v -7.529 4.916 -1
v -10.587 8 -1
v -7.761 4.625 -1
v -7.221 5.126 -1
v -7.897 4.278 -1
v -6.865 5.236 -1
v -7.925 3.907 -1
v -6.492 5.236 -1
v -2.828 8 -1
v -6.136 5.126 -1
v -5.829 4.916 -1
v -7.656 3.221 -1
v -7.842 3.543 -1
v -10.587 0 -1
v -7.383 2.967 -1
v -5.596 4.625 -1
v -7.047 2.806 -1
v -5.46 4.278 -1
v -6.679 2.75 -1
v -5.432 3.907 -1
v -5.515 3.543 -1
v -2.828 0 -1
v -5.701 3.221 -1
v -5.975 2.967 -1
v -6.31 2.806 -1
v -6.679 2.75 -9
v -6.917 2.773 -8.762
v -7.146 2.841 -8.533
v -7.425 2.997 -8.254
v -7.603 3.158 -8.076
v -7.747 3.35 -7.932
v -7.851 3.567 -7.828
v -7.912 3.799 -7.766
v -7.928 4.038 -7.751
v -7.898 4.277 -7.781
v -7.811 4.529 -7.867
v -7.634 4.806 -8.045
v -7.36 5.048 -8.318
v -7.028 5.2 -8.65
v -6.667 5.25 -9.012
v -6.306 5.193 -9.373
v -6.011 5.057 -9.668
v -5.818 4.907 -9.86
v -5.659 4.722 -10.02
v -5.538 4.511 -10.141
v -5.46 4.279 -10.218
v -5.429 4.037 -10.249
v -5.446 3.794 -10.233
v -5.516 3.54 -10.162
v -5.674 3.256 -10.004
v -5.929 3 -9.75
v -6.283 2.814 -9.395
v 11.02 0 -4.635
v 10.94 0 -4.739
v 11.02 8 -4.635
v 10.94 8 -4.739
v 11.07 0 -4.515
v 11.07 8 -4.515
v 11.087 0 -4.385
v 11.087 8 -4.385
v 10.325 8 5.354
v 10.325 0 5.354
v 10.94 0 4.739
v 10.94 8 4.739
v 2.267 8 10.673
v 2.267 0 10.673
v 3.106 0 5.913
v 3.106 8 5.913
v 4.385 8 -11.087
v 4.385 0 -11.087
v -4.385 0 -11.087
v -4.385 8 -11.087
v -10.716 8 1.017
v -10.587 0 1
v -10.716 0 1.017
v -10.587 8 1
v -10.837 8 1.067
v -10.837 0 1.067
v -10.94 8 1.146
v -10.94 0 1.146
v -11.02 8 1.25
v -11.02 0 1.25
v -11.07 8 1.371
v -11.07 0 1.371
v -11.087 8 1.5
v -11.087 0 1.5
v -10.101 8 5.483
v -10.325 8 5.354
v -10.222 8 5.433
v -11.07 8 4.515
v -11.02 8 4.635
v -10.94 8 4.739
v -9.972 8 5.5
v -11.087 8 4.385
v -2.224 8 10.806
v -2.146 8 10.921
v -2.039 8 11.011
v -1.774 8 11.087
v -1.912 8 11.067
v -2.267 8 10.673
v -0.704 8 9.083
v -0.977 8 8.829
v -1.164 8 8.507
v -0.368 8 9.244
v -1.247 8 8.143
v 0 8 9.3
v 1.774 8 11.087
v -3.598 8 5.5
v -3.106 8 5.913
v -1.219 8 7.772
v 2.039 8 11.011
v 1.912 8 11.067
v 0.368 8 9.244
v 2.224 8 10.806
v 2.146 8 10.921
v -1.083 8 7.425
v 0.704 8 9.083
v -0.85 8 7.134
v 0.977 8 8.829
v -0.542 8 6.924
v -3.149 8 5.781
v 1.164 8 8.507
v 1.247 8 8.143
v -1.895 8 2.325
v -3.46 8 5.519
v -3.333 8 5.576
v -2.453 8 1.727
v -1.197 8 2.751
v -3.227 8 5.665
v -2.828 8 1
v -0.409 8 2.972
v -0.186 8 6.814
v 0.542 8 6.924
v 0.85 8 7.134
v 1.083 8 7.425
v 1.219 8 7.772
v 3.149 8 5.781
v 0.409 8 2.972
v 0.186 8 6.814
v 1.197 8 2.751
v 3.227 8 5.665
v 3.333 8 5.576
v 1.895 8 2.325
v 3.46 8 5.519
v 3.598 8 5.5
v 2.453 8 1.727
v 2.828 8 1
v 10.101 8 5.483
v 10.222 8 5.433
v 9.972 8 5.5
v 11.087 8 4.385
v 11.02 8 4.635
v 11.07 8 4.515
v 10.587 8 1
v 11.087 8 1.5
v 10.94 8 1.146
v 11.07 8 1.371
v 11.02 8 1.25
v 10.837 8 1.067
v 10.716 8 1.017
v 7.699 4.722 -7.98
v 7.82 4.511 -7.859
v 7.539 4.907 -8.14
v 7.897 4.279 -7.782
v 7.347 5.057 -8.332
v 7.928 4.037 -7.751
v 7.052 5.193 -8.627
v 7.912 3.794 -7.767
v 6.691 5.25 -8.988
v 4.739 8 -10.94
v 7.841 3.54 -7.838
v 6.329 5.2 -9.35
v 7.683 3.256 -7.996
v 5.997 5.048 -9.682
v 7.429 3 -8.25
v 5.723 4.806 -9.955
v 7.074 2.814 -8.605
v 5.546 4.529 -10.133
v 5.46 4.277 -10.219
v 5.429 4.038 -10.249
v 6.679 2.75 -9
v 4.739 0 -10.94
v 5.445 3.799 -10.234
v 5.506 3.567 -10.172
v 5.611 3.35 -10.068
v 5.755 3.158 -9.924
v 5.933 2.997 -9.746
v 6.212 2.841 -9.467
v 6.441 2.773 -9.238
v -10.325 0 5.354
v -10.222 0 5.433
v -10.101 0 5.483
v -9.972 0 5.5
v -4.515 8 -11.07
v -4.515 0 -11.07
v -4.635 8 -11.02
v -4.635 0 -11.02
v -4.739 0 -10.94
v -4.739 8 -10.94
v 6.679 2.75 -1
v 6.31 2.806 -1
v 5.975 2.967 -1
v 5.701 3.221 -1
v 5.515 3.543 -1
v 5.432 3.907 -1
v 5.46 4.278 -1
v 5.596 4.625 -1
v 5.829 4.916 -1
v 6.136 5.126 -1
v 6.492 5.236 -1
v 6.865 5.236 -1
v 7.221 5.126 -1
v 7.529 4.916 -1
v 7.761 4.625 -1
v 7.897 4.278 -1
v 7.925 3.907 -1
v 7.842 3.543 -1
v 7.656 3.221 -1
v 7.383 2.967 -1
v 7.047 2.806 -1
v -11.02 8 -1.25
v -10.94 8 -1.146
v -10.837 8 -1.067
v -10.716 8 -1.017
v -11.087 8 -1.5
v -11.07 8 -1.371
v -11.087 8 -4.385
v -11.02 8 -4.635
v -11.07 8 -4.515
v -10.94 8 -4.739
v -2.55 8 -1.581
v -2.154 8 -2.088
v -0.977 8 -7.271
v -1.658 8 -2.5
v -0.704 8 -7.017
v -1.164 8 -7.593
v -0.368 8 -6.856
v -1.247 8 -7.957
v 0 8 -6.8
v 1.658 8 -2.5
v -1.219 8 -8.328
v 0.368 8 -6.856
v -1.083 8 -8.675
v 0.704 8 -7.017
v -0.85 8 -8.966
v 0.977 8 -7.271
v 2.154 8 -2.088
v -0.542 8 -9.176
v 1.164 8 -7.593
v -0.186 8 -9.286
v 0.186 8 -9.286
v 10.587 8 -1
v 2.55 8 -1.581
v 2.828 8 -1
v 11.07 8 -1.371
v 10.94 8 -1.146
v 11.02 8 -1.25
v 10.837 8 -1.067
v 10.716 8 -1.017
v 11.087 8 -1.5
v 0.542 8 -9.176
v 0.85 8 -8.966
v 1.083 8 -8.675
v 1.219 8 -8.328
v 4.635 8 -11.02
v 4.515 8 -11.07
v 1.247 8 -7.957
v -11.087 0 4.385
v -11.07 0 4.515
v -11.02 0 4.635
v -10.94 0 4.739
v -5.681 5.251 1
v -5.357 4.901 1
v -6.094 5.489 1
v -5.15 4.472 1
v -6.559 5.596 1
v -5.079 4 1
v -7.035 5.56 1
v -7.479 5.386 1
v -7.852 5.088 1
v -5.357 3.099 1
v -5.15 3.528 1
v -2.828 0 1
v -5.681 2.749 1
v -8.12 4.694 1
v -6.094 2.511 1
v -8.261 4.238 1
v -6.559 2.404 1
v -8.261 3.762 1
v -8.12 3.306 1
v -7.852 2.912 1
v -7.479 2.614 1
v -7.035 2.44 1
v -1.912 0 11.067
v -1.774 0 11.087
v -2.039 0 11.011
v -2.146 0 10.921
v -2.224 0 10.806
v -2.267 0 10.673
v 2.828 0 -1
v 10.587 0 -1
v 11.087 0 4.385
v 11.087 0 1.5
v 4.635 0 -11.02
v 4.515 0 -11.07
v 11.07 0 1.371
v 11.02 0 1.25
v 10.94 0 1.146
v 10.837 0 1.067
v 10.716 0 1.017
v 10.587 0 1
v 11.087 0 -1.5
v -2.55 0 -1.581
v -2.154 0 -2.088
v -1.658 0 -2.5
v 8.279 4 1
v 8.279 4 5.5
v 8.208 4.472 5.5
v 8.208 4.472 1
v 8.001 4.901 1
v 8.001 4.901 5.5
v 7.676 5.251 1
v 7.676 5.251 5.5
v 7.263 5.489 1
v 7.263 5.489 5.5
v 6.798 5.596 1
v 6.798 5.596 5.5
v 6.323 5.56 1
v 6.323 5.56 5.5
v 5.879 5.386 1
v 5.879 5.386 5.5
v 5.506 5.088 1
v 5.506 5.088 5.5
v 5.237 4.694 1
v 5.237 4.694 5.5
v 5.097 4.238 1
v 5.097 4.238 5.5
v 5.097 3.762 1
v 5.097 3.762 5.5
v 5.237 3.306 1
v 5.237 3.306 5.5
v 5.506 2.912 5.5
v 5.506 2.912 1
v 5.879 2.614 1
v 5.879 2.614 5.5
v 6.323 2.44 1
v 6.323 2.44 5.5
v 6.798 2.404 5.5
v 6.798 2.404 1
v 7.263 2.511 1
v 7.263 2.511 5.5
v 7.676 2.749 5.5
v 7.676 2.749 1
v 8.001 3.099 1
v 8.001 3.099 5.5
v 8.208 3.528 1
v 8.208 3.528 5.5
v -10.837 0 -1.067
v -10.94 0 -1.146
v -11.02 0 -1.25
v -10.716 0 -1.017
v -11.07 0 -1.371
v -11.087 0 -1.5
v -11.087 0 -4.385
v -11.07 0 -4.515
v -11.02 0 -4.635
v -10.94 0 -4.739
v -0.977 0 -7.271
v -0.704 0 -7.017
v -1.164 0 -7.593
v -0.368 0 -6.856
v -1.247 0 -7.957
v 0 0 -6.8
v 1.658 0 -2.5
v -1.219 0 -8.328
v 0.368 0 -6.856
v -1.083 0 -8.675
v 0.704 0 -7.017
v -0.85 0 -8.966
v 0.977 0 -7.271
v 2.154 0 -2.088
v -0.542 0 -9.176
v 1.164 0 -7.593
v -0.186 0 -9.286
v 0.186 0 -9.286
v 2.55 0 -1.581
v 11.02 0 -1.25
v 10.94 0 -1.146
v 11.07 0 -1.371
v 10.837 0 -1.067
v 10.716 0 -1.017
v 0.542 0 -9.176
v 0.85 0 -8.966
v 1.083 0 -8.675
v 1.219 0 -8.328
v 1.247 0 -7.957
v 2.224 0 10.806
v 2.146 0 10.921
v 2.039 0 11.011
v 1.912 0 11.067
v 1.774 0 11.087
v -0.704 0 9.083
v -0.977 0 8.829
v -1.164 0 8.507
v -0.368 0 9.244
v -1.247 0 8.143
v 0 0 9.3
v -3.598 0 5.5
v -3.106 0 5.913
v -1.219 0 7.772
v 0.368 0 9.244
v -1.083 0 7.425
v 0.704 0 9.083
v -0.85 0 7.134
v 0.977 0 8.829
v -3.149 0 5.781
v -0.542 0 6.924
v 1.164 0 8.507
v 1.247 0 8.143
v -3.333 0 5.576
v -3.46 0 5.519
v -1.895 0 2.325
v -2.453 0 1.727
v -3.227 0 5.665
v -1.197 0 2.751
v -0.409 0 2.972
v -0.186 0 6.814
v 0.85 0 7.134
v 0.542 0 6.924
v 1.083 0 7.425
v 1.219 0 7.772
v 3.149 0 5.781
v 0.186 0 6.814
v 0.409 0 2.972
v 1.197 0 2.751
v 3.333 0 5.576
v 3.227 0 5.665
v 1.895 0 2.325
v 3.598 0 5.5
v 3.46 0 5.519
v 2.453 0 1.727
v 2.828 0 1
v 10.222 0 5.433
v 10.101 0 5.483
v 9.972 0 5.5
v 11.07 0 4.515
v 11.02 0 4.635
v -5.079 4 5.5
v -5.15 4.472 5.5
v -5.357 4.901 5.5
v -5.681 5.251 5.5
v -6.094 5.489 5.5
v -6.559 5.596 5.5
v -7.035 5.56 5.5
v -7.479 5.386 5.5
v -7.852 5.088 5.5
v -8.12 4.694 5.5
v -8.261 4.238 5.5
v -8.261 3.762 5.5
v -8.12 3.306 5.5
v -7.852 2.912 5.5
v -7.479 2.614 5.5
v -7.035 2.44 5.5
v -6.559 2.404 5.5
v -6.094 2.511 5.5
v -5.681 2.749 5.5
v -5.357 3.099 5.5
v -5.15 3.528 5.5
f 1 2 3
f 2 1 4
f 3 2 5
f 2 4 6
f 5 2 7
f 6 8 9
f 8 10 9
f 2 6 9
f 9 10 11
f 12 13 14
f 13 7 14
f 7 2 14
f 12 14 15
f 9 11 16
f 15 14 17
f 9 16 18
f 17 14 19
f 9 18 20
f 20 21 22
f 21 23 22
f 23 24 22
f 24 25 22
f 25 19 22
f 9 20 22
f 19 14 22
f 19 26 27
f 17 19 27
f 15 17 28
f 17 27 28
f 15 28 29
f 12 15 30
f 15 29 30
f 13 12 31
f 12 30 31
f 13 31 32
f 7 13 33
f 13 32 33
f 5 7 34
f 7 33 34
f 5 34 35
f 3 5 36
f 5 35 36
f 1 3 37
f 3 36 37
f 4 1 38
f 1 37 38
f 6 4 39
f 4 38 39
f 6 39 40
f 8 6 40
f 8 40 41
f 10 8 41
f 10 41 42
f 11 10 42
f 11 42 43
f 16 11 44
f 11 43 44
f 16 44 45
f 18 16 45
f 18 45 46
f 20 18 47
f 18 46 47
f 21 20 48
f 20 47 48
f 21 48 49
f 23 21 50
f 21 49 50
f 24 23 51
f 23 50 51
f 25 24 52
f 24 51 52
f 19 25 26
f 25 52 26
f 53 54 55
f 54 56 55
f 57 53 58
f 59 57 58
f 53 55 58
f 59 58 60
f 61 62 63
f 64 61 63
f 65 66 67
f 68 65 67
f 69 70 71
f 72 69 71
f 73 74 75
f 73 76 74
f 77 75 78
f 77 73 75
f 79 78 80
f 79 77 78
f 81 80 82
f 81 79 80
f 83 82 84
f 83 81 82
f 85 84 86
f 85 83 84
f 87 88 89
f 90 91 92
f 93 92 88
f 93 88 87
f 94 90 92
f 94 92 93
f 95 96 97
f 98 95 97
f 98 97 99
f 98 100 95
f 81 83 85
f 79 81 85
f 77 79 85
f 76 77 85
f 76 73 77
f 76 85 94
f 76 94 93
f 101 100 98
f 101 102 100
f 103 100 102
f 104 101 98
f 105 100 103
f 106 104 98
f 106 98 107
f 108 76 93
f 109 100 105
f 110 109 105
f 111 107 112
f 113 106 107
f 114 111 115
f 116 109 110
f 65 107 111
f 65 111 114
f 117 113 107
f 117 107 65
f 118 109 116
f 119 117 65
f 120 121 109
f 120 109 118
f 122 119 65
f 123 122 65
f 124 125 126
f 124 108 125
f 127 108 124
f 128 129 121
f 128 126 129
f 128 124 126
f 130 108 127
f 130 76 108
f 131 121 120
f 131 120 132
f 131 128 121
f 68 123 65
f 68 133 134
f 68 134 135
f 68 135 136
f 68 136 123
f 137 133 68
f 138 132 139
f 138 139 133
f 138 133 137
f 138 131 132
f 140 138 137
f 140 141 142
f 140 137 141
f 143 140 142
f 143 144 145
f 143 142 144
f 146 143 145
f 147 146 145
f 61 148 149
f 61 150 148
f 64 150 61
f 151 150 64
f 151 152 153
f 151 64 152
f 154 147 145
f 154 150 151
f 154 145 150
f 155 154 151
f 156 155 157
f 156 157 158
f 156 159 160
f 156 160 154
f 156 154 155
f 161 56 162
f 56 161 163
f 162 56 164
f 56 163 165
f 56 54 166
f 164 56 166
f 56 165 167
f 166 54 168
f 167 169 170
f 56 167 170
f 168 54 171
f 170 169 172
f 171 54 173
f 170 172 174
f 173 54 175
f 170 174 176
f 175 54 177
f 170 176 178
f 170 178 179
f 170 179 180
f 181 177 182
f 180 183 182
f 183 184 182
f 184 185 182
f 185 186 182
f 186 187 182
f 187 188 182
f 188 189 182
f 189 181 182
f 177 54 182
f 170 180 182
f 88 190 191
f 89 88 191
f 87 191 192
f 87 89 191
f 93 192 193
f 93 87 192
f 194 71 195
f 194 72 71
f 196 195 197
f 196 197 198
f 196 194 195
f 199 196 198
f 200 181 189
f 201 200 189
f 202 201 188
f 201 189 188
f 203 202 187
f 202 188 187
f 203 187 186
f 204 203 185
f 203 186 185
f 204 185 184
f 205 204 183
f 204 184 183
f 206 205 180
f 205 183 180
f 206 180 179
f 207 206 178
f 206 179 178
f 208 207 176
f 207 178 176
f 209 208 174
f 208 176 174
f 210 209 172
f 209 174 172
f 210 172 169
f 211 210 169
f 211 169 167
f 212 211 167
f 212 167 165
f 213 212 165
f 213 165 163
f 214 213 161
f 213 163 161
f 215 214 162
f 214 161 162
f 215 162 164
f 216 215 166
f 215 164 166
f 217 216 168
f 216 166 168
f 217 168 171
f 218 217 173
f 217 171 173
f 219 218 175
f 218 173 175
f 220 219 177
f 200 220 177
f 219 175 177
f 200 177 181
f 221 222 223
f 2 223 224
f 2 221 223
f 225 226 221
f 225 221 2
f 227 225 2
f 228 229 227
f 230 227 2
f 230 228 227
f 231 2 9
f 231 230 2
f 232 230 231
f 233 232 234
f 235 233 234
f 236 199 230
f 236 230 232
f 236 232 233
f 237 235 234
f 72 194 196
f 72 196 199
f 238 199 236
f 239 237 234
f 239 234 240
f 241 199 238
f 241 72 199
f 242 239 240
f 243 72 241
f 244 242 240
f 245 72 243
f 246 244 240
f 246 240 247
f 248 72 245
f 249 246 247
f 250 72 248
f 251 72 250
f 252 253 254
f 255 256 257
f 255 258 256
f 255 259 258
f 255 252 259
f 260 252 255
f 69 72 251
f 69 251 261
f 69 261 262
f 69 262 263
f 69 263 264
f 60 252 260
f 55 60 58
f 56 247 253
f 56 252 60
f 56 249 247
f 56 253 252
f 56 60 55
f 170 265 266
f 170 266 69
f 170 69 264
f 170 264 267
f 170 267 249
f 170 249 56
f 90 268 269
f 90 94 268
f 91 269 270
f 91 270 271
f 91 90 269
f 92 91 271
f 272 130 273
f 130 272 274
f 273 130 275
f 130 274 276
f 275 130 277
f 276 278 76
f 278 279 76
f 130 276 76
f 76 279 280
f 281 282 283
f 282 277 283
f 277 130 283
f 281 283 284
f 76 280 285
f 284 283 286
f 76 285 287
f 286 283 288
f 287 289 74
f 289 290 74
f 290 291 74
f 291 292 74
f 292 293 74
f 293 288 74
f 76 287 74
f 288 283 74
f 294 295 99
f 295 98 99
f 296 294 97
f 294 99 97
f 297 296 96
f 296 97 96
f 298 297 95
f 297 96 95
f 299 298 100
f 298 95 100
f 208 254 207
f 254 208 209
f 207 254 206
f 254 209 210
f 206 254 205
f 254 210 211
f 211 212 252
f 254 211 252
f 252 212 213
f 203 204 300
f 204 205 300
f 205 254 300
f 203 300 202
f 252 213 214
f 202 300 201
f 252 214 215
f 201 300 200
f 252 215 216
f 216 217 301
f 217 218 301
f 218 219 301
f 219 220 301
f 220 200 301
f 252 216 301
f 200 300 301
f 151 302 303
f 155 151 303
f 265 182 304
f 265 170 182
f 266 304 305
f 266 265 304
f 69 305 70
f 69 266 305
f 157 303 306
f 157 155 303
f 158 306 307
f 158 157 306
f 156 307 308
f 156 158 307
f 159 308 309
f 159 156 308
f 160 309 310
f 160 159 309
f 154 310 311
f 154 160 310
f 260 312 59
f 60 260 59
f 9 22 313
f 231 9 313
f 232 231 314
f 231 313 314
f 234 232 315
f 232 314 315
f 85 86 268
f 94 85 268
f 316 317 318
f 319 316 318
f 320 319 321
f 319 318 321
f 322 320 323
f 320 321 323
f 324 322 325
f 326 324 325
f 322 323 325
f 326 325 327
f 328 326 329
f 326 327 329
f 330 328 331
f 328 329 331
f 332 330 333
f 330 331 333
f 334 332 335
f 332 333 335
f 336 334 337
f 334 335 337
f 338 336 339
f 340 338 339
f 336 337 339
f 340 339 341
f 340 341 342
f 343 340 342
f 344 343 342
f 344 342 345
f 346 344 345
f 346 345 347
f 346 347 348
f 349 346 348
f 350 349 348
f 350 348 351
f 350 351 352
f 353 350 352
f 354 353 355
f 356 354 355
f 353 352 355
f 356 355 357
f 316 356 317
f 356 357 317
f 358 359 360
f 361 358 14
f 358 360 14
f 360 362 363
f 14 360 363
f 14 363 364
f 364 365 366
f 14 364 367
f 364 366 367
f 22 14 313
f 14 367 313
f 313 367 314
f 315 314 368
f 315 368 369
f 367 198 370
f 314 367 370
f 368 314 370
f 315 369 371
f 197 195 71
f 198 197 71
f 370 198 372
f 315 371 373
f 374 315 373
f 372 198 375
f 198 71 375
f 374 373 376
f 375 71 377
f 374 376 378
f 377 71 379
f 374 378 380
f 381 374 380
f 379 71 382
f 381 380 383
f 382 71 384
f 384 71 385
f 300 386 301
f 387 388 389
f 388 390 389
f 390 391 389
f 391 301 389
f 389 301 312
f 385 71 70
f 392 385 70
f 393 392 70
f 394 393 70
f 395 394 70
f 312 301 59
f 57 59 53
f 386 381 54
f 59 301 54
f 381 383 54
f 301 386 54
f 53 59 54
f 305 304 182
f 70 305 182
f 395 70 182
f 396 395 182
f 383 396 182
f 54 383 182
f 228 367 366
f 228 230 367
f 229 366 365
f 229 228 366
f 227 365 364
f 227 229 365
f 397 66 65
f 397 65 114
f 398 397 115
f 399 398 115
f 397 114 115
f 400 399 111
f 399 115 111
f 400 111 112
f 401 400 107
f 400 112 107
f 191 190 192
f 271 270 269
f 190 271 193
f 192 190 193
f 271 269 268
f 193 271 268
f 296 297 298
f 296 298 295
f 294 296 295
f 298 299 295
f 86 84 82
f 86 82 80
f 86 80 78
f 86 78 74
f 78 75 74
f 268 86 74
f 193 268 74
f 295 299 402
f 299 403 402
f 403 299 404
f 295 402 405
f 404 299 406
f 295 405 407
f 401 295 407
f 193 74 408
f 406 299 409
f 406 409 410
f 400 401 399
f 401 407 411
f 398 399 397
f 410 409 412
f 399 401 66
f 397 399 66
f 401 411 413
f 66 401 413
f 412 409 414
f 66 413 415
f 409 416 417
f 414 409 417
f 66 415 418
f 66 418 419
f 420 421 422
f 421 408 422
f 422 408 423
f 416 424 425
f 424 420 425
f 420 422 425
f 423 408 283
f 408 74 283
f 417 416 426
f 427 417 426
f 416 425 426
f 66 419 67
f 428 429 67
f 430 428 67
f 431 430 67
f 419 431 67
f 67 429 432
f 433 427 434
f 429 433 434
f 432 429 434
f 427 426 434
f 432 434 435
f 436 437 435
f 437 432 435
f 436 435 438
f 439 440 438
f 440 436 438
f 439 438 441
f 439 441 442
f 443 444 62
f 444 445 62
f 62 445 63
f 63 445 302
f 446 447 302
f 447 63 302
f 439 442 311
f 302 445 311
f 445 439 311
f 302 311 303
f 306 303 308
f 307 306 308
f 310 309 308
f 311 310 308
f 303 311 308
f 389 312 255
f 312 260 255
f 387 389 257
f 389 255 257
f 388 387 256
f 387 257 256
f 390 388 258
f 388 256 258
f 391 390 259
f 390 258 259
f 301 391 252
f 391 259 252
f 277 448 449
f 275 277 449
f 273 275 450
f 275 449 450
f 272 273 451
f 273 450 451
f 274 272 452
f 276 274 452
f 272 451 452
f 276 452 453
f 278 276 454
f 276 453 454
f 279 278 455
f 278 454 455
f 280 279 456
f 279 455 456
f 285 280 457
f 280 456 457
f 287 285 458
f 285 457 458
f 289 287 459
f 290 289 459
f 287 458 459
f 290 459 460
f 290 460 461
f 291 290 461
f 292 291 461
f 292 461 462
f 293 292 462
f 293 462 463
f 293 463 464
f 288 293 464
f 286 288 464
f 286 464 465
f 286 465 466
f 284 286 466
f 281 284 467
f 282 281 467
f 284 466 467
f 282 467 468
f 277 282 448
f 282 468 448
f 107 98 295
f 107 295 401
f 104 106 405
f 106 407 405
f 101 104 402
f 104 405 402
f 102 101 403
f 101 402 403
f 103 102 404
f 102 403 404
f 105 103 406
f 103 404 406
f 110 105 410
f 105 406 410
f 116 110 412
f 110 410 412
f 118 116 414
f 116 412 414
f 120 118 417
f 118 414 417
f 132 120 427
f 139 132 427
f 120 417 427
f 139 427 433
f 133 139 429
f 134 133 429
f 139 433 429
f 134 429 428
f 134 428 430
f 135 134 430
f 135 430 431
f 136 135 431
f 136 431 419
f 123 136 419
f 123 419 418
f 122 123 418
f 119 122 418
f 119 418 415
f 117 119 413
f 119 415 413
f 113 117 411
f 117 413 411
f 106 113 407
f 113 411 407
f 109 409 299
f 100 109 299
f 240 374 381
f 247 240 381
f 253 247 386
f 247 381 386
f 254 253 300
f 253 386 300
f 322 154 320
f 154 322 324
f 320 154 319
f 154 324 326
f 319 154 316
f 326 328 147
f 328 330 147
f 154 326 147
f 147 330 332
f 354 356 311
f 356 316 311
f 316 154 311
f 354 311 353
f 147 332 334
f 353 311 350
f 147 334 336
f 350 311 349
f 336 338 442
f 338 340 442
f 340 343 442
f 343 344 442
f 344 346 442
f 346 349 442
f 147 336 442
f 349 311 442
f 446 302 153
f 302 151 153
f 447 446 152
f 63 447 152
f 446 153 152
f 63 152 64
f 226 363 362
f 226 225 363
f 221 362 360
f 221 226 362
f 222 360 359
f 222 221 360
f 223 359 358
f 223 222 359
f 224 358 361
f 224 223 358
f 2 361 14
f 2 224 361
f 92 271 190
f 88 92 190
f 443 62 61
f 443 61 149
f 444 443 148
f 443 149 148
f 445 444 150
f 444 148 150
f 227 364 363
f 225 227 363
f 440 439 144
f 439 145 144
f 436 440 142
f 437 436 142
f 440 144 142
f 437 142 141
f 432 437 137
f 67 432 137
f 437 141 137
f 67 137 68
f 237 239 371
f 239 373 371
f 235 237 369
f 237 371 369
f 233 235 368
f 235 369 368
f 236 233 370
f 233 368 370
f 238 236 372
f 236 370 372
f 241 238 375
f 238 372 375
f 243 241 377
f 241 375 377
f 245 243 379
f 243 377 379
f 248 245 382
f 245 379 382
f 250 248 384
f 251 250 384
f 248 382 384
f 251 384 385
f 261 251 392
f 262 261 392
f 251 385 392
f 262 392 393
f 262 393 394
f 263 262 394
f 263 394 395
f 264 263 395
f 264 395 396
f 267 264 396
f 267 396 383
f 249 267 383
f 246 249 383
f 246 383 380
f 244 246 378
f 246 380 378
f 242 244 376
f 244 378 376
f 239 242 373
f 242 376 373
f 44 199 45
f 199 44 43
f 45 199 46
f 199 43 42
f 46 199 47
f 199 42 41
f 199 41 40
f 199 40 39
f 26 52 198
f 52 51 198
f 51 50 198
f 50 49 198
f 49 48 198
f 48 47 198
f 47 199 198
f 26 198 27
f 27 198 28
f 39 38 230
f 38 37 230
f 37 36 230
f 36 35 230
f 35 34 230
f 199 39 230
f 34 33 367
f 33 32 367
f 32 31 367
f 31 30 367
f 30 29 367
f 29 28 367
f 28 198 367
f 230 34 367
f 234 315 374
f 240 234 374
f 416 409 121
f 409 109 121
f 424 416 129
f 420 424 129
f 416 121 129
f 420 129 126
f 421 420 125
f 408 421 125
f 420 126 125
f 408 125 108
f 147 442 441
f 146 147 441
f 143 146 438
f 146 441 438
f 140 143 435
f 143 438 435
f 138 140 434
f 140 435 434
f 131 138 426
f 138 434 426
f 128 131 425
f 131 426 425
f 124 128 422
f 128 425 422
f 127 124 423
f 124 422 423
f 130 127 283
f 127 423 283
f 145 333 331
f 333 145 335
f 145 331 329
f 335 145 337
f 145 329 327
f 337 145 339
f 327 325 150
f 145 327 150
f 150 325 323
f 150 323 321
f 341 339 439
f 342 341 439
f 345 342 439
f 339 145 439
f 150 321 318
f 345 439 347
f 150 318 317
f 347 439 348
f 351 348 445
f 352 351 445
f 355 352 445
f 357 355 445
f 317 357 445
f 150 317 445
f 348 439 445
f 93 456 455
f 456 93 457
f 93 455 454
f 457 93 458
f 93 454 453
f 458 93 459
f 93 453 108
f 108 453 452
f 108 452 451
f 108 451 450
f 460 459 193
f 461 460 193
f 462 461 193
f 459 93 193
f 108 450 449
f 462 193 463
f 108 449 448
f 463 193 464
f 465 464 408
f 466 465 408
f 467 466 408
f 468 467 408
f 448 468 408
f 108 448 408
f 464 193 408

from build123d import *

# Parameters (mm, degrees)
SKETCH_1_R                  = 1
EXTRUDE_1_DEPTH             = 8
EXTRUDE_1_2_DEPTH           = 8
SKETCH_3_R                  = 1
CUT_EXTRUDE_1_DEPTH         = 22.494777849
SKETCH_4_R                  = 1.6
CUT_EXTRUDE_2_DEPTH         = 4.5
FILLET_1_R                  = 0.5
FILLET_2_R                  = 0.5
SKETCH_10_W                 = 1.25
SKETCH_10_H                 = 8
HOLE_WIZARD_M3_6_AT_2_COUNT = 2
HOLE_WIZARD_M3_6_AT_2_PITCH = 16.1
SKETCH_12_W                 = 1.25
SKETCH_12_H                 = 10.08655439
HOLE_WIZARD_M3_7_AT_2_COUNT = 2
HOLE_WIZARD_M3_7_AT_2_PITCH = 13.357511157


with BuildPart() as part:
    # 草图1 → 凸台-拉伸1 (new body)
    with BuildSketch(Plane(origin=(0, 0, 0), x_dir=(1, 0, 0), z_dir=(0, 1, 0))):
        with BuildLine():
            Line((11.08655439, 4.592201188), (4.592201188, 11.08655439))
            Line((4.592201188, 11.08655439), (-4.592201188, 11.08655439))
            Line((-4.592201188, 11.08655439), (-11.08655439, 4.592201188))
            Line((-11.08655439, 4.592201188), (-11.08655439, 1))
            Line((-11.08655439, 1), (-2.828427125, 1))
            ThreePointArc((-2.828427125, 1), (-2.365419176, 1.84520788), (-1.658312395, 2.5))
            Line((-1.658312395, 2.5), (1.658312395, 2.5))
            ThreePointArc((1.658312395, 2.5), (2.365419176, 1.84520788), (2.828427125, 1))
            Line((2.828427125, 1), (11.08655439, 1))
            Line((11.08655439, 1), (11.08655439, 4.592201188))
        make_face()
        with Locations(Location((0, 8.05, 0), (0, 0, 270))):
            Circle(SKETCH_1_R, mode=Mode.SUBTRACT)
    extrude(amount=EXTRUDE_1_DEPTH)


with BuildPart() as body_2:
    # 草图1 → Extrude 1 2 (new body)
    with BuildSketch(Plane(origin=(0, 0, 0), x_dir=(1, 0, 0), z_dir=(0, 1, 0))):
        with BuildLine():
            Line((11.08655439, -4.592201188), (11.08655439, -1))
            Line((11.08655439, -1), (2.828427125, -1))
            ThreePointArc((2.828427125, -1), (0, -3), (-2.828427125, -1))
            Line((-2.828427125, -1), (-11.08655439, -1))
            Line((-11.08655439, -1), (-11.08655439, -4.592201188))
            Line((-11.08655439, -4.592201188), (-10.178755579, -5.5))
            Line((-10.178755579, -5.5), (-3.178755579, -5.5))
            Line((-3.178755579, -5.5), (-2.19369531, -11.08655439))
            Line((-2.19369531, -11.08655439), (2.19369531, -11.08655439))
            Line((2.19369531, -11.08655439), (3.178755579, -5.5))
            Line((3.178755579, -5.5), (10.178755579, -5.5))
            Line((10.178755579, -5.5), (11.08655439, -4.592201188))
        make_face()
        with Locations(Location((0, -8.05, 0), (0, 0, 270))):
            Circle(SKETCH_1_R, mode=Mode.SUBTRACT)
    extrude(amount=EXTRUDE_1_2_DEPTH)


with BuildPart() as cut_extrude_1_tool:
    # 草图3 → 切除-拉伸1 (new, through all)
    with BuildSketch(Plane.XY.offset(5.5)):
        with Locations((-6.678755579, 4)):
            Circle(SKETCH_3_R)
        with Locations((6.678755579, 4)):
            Circle(SKETCH_3_R)
    extrude(amount=-CUT_EXTRUDE_1_DEPTH)


with BuildPart() as part_1:
    add(part.part)

    # 切除-拉伸1: cut by cut_extrude_1_tool
    add(cut_extrude_1_tool.part, mode=Mode.SUBTRACT)

    # 圆角1
    fillet_1_edges = [part_1.edges().sort_by_distance(p)[0] for p in [
        (-11.08655439, 4, -1),
        (-11.08655439, 4, -4.592201188),
        (-4.592201188, 4, -11.08655439),
        (4.592201188, 4, -11.08655439),
        (11.08655439, 4, -4.592201188),
        (11.08655439, 4, -1),
    ]]
    fillet(fillet_1_edges, radius=FILLET_1_R)

    # 草图10 → M3 螺纹孔6 (revolve, cut)
    with BuildSketch(Plane(origin=(0, 8, -8.05), x_dir=(0, 0, 1), z_dir=(1, 0, 0))):
        with Locations((0.625, 4)):
            Rectangle(SKETCH_10_W, SKETCH_10_H)
    hole_wizard_m3_6 = revolve(axis=Axis((0, 14.35, -8.05), (0, -1, 0)), mode=Mode.SUBTRACT)

    # 草图12 → M3 螺纹孔7 (revolve, cut)
    with BuildSketch(Plane(origin=(6.678755579, 4, -1), x_dir=(0, -1, 0), z_dir=(1, 0, 0))):
        with Locations((0.625, 5.043277195)):
            Rectangle(SKETCH_12_W, SKETCH_12_H)
    hole_wizard_m3_7 = revolve(axis=Axis((6.678755579, 4, 5.35), (0, 0, -1)), mode=Mode.SUBTRACT)

    # M3 螺纹孔7 at 2: M3 螺纹孔7 ×2
    with Locations(*[(-i * HOLE_WIZARD_M3_7_AT_2_PITCH, 0, 0) for i in range(1, HOLE_WIZARD_M3_7_AT_2_COUNT)]):
        add(hole_wizard_m3_7, mode=Mode.SUBTRACT)


with BuildPart() as body_2_1:
    add(body_2.part)

    # 切除-拉伸1: cut by cut_extrude_1_tool
    add(cut_extrude_1_tool.part, mode=Mode.SUBTRACT)

    # 草图4 → 切除-拉伸2 (cut)
    with BuildSketch(Plane.XY.offset(5.5)):
        with Locations((-6.678755579, 4)):
            Circle(SKETCH_4_R)
        with Locations((6.678755579, 4)):
            Circle(SKETCH_4_R)
    extrude(amount=-CUT_EXTRUDE_2_DEPTH, mode=Mode.SUBTRACT)

    # 圆角2
    fillet_2_edges = [body_2_1.edges().sort_by_distance(p)[0] for p in [
        (11.08655439, 4, 1),
        (11.08655439, 4, 4.592201188),
        (10.178755579, 4, 5.5),
        (3.178755579, 4, 5.5),
        (2.19369531, 4, 11.08655439),
        (-2.19369531, 4, 11.08655439),
        (-3.178755579, 4, 5.5),
        (-10.178755579, 4, 5.5),
        (-11.08655439, 4, 4.592201188),
        (-11.08655439, 4, 1),
    ]]
    fillet(fillet_2_edges, radius=FILLET_2_R)

    # M3 螺纹孔6 at 2: M3 螺纹孔6 ×2
    with Locations(*[(0, 0, i * HOLE_WIZARD_M3_6_AT_2_PITCH) for i in range(1, HOLE_WIZARD_M3_6_AT_2_COUNT)]):
        add(hole_wizard_m3_6, mode=Mode.SUBTRACT)


solid = Compound([part_1.part, body_2_1.part])
